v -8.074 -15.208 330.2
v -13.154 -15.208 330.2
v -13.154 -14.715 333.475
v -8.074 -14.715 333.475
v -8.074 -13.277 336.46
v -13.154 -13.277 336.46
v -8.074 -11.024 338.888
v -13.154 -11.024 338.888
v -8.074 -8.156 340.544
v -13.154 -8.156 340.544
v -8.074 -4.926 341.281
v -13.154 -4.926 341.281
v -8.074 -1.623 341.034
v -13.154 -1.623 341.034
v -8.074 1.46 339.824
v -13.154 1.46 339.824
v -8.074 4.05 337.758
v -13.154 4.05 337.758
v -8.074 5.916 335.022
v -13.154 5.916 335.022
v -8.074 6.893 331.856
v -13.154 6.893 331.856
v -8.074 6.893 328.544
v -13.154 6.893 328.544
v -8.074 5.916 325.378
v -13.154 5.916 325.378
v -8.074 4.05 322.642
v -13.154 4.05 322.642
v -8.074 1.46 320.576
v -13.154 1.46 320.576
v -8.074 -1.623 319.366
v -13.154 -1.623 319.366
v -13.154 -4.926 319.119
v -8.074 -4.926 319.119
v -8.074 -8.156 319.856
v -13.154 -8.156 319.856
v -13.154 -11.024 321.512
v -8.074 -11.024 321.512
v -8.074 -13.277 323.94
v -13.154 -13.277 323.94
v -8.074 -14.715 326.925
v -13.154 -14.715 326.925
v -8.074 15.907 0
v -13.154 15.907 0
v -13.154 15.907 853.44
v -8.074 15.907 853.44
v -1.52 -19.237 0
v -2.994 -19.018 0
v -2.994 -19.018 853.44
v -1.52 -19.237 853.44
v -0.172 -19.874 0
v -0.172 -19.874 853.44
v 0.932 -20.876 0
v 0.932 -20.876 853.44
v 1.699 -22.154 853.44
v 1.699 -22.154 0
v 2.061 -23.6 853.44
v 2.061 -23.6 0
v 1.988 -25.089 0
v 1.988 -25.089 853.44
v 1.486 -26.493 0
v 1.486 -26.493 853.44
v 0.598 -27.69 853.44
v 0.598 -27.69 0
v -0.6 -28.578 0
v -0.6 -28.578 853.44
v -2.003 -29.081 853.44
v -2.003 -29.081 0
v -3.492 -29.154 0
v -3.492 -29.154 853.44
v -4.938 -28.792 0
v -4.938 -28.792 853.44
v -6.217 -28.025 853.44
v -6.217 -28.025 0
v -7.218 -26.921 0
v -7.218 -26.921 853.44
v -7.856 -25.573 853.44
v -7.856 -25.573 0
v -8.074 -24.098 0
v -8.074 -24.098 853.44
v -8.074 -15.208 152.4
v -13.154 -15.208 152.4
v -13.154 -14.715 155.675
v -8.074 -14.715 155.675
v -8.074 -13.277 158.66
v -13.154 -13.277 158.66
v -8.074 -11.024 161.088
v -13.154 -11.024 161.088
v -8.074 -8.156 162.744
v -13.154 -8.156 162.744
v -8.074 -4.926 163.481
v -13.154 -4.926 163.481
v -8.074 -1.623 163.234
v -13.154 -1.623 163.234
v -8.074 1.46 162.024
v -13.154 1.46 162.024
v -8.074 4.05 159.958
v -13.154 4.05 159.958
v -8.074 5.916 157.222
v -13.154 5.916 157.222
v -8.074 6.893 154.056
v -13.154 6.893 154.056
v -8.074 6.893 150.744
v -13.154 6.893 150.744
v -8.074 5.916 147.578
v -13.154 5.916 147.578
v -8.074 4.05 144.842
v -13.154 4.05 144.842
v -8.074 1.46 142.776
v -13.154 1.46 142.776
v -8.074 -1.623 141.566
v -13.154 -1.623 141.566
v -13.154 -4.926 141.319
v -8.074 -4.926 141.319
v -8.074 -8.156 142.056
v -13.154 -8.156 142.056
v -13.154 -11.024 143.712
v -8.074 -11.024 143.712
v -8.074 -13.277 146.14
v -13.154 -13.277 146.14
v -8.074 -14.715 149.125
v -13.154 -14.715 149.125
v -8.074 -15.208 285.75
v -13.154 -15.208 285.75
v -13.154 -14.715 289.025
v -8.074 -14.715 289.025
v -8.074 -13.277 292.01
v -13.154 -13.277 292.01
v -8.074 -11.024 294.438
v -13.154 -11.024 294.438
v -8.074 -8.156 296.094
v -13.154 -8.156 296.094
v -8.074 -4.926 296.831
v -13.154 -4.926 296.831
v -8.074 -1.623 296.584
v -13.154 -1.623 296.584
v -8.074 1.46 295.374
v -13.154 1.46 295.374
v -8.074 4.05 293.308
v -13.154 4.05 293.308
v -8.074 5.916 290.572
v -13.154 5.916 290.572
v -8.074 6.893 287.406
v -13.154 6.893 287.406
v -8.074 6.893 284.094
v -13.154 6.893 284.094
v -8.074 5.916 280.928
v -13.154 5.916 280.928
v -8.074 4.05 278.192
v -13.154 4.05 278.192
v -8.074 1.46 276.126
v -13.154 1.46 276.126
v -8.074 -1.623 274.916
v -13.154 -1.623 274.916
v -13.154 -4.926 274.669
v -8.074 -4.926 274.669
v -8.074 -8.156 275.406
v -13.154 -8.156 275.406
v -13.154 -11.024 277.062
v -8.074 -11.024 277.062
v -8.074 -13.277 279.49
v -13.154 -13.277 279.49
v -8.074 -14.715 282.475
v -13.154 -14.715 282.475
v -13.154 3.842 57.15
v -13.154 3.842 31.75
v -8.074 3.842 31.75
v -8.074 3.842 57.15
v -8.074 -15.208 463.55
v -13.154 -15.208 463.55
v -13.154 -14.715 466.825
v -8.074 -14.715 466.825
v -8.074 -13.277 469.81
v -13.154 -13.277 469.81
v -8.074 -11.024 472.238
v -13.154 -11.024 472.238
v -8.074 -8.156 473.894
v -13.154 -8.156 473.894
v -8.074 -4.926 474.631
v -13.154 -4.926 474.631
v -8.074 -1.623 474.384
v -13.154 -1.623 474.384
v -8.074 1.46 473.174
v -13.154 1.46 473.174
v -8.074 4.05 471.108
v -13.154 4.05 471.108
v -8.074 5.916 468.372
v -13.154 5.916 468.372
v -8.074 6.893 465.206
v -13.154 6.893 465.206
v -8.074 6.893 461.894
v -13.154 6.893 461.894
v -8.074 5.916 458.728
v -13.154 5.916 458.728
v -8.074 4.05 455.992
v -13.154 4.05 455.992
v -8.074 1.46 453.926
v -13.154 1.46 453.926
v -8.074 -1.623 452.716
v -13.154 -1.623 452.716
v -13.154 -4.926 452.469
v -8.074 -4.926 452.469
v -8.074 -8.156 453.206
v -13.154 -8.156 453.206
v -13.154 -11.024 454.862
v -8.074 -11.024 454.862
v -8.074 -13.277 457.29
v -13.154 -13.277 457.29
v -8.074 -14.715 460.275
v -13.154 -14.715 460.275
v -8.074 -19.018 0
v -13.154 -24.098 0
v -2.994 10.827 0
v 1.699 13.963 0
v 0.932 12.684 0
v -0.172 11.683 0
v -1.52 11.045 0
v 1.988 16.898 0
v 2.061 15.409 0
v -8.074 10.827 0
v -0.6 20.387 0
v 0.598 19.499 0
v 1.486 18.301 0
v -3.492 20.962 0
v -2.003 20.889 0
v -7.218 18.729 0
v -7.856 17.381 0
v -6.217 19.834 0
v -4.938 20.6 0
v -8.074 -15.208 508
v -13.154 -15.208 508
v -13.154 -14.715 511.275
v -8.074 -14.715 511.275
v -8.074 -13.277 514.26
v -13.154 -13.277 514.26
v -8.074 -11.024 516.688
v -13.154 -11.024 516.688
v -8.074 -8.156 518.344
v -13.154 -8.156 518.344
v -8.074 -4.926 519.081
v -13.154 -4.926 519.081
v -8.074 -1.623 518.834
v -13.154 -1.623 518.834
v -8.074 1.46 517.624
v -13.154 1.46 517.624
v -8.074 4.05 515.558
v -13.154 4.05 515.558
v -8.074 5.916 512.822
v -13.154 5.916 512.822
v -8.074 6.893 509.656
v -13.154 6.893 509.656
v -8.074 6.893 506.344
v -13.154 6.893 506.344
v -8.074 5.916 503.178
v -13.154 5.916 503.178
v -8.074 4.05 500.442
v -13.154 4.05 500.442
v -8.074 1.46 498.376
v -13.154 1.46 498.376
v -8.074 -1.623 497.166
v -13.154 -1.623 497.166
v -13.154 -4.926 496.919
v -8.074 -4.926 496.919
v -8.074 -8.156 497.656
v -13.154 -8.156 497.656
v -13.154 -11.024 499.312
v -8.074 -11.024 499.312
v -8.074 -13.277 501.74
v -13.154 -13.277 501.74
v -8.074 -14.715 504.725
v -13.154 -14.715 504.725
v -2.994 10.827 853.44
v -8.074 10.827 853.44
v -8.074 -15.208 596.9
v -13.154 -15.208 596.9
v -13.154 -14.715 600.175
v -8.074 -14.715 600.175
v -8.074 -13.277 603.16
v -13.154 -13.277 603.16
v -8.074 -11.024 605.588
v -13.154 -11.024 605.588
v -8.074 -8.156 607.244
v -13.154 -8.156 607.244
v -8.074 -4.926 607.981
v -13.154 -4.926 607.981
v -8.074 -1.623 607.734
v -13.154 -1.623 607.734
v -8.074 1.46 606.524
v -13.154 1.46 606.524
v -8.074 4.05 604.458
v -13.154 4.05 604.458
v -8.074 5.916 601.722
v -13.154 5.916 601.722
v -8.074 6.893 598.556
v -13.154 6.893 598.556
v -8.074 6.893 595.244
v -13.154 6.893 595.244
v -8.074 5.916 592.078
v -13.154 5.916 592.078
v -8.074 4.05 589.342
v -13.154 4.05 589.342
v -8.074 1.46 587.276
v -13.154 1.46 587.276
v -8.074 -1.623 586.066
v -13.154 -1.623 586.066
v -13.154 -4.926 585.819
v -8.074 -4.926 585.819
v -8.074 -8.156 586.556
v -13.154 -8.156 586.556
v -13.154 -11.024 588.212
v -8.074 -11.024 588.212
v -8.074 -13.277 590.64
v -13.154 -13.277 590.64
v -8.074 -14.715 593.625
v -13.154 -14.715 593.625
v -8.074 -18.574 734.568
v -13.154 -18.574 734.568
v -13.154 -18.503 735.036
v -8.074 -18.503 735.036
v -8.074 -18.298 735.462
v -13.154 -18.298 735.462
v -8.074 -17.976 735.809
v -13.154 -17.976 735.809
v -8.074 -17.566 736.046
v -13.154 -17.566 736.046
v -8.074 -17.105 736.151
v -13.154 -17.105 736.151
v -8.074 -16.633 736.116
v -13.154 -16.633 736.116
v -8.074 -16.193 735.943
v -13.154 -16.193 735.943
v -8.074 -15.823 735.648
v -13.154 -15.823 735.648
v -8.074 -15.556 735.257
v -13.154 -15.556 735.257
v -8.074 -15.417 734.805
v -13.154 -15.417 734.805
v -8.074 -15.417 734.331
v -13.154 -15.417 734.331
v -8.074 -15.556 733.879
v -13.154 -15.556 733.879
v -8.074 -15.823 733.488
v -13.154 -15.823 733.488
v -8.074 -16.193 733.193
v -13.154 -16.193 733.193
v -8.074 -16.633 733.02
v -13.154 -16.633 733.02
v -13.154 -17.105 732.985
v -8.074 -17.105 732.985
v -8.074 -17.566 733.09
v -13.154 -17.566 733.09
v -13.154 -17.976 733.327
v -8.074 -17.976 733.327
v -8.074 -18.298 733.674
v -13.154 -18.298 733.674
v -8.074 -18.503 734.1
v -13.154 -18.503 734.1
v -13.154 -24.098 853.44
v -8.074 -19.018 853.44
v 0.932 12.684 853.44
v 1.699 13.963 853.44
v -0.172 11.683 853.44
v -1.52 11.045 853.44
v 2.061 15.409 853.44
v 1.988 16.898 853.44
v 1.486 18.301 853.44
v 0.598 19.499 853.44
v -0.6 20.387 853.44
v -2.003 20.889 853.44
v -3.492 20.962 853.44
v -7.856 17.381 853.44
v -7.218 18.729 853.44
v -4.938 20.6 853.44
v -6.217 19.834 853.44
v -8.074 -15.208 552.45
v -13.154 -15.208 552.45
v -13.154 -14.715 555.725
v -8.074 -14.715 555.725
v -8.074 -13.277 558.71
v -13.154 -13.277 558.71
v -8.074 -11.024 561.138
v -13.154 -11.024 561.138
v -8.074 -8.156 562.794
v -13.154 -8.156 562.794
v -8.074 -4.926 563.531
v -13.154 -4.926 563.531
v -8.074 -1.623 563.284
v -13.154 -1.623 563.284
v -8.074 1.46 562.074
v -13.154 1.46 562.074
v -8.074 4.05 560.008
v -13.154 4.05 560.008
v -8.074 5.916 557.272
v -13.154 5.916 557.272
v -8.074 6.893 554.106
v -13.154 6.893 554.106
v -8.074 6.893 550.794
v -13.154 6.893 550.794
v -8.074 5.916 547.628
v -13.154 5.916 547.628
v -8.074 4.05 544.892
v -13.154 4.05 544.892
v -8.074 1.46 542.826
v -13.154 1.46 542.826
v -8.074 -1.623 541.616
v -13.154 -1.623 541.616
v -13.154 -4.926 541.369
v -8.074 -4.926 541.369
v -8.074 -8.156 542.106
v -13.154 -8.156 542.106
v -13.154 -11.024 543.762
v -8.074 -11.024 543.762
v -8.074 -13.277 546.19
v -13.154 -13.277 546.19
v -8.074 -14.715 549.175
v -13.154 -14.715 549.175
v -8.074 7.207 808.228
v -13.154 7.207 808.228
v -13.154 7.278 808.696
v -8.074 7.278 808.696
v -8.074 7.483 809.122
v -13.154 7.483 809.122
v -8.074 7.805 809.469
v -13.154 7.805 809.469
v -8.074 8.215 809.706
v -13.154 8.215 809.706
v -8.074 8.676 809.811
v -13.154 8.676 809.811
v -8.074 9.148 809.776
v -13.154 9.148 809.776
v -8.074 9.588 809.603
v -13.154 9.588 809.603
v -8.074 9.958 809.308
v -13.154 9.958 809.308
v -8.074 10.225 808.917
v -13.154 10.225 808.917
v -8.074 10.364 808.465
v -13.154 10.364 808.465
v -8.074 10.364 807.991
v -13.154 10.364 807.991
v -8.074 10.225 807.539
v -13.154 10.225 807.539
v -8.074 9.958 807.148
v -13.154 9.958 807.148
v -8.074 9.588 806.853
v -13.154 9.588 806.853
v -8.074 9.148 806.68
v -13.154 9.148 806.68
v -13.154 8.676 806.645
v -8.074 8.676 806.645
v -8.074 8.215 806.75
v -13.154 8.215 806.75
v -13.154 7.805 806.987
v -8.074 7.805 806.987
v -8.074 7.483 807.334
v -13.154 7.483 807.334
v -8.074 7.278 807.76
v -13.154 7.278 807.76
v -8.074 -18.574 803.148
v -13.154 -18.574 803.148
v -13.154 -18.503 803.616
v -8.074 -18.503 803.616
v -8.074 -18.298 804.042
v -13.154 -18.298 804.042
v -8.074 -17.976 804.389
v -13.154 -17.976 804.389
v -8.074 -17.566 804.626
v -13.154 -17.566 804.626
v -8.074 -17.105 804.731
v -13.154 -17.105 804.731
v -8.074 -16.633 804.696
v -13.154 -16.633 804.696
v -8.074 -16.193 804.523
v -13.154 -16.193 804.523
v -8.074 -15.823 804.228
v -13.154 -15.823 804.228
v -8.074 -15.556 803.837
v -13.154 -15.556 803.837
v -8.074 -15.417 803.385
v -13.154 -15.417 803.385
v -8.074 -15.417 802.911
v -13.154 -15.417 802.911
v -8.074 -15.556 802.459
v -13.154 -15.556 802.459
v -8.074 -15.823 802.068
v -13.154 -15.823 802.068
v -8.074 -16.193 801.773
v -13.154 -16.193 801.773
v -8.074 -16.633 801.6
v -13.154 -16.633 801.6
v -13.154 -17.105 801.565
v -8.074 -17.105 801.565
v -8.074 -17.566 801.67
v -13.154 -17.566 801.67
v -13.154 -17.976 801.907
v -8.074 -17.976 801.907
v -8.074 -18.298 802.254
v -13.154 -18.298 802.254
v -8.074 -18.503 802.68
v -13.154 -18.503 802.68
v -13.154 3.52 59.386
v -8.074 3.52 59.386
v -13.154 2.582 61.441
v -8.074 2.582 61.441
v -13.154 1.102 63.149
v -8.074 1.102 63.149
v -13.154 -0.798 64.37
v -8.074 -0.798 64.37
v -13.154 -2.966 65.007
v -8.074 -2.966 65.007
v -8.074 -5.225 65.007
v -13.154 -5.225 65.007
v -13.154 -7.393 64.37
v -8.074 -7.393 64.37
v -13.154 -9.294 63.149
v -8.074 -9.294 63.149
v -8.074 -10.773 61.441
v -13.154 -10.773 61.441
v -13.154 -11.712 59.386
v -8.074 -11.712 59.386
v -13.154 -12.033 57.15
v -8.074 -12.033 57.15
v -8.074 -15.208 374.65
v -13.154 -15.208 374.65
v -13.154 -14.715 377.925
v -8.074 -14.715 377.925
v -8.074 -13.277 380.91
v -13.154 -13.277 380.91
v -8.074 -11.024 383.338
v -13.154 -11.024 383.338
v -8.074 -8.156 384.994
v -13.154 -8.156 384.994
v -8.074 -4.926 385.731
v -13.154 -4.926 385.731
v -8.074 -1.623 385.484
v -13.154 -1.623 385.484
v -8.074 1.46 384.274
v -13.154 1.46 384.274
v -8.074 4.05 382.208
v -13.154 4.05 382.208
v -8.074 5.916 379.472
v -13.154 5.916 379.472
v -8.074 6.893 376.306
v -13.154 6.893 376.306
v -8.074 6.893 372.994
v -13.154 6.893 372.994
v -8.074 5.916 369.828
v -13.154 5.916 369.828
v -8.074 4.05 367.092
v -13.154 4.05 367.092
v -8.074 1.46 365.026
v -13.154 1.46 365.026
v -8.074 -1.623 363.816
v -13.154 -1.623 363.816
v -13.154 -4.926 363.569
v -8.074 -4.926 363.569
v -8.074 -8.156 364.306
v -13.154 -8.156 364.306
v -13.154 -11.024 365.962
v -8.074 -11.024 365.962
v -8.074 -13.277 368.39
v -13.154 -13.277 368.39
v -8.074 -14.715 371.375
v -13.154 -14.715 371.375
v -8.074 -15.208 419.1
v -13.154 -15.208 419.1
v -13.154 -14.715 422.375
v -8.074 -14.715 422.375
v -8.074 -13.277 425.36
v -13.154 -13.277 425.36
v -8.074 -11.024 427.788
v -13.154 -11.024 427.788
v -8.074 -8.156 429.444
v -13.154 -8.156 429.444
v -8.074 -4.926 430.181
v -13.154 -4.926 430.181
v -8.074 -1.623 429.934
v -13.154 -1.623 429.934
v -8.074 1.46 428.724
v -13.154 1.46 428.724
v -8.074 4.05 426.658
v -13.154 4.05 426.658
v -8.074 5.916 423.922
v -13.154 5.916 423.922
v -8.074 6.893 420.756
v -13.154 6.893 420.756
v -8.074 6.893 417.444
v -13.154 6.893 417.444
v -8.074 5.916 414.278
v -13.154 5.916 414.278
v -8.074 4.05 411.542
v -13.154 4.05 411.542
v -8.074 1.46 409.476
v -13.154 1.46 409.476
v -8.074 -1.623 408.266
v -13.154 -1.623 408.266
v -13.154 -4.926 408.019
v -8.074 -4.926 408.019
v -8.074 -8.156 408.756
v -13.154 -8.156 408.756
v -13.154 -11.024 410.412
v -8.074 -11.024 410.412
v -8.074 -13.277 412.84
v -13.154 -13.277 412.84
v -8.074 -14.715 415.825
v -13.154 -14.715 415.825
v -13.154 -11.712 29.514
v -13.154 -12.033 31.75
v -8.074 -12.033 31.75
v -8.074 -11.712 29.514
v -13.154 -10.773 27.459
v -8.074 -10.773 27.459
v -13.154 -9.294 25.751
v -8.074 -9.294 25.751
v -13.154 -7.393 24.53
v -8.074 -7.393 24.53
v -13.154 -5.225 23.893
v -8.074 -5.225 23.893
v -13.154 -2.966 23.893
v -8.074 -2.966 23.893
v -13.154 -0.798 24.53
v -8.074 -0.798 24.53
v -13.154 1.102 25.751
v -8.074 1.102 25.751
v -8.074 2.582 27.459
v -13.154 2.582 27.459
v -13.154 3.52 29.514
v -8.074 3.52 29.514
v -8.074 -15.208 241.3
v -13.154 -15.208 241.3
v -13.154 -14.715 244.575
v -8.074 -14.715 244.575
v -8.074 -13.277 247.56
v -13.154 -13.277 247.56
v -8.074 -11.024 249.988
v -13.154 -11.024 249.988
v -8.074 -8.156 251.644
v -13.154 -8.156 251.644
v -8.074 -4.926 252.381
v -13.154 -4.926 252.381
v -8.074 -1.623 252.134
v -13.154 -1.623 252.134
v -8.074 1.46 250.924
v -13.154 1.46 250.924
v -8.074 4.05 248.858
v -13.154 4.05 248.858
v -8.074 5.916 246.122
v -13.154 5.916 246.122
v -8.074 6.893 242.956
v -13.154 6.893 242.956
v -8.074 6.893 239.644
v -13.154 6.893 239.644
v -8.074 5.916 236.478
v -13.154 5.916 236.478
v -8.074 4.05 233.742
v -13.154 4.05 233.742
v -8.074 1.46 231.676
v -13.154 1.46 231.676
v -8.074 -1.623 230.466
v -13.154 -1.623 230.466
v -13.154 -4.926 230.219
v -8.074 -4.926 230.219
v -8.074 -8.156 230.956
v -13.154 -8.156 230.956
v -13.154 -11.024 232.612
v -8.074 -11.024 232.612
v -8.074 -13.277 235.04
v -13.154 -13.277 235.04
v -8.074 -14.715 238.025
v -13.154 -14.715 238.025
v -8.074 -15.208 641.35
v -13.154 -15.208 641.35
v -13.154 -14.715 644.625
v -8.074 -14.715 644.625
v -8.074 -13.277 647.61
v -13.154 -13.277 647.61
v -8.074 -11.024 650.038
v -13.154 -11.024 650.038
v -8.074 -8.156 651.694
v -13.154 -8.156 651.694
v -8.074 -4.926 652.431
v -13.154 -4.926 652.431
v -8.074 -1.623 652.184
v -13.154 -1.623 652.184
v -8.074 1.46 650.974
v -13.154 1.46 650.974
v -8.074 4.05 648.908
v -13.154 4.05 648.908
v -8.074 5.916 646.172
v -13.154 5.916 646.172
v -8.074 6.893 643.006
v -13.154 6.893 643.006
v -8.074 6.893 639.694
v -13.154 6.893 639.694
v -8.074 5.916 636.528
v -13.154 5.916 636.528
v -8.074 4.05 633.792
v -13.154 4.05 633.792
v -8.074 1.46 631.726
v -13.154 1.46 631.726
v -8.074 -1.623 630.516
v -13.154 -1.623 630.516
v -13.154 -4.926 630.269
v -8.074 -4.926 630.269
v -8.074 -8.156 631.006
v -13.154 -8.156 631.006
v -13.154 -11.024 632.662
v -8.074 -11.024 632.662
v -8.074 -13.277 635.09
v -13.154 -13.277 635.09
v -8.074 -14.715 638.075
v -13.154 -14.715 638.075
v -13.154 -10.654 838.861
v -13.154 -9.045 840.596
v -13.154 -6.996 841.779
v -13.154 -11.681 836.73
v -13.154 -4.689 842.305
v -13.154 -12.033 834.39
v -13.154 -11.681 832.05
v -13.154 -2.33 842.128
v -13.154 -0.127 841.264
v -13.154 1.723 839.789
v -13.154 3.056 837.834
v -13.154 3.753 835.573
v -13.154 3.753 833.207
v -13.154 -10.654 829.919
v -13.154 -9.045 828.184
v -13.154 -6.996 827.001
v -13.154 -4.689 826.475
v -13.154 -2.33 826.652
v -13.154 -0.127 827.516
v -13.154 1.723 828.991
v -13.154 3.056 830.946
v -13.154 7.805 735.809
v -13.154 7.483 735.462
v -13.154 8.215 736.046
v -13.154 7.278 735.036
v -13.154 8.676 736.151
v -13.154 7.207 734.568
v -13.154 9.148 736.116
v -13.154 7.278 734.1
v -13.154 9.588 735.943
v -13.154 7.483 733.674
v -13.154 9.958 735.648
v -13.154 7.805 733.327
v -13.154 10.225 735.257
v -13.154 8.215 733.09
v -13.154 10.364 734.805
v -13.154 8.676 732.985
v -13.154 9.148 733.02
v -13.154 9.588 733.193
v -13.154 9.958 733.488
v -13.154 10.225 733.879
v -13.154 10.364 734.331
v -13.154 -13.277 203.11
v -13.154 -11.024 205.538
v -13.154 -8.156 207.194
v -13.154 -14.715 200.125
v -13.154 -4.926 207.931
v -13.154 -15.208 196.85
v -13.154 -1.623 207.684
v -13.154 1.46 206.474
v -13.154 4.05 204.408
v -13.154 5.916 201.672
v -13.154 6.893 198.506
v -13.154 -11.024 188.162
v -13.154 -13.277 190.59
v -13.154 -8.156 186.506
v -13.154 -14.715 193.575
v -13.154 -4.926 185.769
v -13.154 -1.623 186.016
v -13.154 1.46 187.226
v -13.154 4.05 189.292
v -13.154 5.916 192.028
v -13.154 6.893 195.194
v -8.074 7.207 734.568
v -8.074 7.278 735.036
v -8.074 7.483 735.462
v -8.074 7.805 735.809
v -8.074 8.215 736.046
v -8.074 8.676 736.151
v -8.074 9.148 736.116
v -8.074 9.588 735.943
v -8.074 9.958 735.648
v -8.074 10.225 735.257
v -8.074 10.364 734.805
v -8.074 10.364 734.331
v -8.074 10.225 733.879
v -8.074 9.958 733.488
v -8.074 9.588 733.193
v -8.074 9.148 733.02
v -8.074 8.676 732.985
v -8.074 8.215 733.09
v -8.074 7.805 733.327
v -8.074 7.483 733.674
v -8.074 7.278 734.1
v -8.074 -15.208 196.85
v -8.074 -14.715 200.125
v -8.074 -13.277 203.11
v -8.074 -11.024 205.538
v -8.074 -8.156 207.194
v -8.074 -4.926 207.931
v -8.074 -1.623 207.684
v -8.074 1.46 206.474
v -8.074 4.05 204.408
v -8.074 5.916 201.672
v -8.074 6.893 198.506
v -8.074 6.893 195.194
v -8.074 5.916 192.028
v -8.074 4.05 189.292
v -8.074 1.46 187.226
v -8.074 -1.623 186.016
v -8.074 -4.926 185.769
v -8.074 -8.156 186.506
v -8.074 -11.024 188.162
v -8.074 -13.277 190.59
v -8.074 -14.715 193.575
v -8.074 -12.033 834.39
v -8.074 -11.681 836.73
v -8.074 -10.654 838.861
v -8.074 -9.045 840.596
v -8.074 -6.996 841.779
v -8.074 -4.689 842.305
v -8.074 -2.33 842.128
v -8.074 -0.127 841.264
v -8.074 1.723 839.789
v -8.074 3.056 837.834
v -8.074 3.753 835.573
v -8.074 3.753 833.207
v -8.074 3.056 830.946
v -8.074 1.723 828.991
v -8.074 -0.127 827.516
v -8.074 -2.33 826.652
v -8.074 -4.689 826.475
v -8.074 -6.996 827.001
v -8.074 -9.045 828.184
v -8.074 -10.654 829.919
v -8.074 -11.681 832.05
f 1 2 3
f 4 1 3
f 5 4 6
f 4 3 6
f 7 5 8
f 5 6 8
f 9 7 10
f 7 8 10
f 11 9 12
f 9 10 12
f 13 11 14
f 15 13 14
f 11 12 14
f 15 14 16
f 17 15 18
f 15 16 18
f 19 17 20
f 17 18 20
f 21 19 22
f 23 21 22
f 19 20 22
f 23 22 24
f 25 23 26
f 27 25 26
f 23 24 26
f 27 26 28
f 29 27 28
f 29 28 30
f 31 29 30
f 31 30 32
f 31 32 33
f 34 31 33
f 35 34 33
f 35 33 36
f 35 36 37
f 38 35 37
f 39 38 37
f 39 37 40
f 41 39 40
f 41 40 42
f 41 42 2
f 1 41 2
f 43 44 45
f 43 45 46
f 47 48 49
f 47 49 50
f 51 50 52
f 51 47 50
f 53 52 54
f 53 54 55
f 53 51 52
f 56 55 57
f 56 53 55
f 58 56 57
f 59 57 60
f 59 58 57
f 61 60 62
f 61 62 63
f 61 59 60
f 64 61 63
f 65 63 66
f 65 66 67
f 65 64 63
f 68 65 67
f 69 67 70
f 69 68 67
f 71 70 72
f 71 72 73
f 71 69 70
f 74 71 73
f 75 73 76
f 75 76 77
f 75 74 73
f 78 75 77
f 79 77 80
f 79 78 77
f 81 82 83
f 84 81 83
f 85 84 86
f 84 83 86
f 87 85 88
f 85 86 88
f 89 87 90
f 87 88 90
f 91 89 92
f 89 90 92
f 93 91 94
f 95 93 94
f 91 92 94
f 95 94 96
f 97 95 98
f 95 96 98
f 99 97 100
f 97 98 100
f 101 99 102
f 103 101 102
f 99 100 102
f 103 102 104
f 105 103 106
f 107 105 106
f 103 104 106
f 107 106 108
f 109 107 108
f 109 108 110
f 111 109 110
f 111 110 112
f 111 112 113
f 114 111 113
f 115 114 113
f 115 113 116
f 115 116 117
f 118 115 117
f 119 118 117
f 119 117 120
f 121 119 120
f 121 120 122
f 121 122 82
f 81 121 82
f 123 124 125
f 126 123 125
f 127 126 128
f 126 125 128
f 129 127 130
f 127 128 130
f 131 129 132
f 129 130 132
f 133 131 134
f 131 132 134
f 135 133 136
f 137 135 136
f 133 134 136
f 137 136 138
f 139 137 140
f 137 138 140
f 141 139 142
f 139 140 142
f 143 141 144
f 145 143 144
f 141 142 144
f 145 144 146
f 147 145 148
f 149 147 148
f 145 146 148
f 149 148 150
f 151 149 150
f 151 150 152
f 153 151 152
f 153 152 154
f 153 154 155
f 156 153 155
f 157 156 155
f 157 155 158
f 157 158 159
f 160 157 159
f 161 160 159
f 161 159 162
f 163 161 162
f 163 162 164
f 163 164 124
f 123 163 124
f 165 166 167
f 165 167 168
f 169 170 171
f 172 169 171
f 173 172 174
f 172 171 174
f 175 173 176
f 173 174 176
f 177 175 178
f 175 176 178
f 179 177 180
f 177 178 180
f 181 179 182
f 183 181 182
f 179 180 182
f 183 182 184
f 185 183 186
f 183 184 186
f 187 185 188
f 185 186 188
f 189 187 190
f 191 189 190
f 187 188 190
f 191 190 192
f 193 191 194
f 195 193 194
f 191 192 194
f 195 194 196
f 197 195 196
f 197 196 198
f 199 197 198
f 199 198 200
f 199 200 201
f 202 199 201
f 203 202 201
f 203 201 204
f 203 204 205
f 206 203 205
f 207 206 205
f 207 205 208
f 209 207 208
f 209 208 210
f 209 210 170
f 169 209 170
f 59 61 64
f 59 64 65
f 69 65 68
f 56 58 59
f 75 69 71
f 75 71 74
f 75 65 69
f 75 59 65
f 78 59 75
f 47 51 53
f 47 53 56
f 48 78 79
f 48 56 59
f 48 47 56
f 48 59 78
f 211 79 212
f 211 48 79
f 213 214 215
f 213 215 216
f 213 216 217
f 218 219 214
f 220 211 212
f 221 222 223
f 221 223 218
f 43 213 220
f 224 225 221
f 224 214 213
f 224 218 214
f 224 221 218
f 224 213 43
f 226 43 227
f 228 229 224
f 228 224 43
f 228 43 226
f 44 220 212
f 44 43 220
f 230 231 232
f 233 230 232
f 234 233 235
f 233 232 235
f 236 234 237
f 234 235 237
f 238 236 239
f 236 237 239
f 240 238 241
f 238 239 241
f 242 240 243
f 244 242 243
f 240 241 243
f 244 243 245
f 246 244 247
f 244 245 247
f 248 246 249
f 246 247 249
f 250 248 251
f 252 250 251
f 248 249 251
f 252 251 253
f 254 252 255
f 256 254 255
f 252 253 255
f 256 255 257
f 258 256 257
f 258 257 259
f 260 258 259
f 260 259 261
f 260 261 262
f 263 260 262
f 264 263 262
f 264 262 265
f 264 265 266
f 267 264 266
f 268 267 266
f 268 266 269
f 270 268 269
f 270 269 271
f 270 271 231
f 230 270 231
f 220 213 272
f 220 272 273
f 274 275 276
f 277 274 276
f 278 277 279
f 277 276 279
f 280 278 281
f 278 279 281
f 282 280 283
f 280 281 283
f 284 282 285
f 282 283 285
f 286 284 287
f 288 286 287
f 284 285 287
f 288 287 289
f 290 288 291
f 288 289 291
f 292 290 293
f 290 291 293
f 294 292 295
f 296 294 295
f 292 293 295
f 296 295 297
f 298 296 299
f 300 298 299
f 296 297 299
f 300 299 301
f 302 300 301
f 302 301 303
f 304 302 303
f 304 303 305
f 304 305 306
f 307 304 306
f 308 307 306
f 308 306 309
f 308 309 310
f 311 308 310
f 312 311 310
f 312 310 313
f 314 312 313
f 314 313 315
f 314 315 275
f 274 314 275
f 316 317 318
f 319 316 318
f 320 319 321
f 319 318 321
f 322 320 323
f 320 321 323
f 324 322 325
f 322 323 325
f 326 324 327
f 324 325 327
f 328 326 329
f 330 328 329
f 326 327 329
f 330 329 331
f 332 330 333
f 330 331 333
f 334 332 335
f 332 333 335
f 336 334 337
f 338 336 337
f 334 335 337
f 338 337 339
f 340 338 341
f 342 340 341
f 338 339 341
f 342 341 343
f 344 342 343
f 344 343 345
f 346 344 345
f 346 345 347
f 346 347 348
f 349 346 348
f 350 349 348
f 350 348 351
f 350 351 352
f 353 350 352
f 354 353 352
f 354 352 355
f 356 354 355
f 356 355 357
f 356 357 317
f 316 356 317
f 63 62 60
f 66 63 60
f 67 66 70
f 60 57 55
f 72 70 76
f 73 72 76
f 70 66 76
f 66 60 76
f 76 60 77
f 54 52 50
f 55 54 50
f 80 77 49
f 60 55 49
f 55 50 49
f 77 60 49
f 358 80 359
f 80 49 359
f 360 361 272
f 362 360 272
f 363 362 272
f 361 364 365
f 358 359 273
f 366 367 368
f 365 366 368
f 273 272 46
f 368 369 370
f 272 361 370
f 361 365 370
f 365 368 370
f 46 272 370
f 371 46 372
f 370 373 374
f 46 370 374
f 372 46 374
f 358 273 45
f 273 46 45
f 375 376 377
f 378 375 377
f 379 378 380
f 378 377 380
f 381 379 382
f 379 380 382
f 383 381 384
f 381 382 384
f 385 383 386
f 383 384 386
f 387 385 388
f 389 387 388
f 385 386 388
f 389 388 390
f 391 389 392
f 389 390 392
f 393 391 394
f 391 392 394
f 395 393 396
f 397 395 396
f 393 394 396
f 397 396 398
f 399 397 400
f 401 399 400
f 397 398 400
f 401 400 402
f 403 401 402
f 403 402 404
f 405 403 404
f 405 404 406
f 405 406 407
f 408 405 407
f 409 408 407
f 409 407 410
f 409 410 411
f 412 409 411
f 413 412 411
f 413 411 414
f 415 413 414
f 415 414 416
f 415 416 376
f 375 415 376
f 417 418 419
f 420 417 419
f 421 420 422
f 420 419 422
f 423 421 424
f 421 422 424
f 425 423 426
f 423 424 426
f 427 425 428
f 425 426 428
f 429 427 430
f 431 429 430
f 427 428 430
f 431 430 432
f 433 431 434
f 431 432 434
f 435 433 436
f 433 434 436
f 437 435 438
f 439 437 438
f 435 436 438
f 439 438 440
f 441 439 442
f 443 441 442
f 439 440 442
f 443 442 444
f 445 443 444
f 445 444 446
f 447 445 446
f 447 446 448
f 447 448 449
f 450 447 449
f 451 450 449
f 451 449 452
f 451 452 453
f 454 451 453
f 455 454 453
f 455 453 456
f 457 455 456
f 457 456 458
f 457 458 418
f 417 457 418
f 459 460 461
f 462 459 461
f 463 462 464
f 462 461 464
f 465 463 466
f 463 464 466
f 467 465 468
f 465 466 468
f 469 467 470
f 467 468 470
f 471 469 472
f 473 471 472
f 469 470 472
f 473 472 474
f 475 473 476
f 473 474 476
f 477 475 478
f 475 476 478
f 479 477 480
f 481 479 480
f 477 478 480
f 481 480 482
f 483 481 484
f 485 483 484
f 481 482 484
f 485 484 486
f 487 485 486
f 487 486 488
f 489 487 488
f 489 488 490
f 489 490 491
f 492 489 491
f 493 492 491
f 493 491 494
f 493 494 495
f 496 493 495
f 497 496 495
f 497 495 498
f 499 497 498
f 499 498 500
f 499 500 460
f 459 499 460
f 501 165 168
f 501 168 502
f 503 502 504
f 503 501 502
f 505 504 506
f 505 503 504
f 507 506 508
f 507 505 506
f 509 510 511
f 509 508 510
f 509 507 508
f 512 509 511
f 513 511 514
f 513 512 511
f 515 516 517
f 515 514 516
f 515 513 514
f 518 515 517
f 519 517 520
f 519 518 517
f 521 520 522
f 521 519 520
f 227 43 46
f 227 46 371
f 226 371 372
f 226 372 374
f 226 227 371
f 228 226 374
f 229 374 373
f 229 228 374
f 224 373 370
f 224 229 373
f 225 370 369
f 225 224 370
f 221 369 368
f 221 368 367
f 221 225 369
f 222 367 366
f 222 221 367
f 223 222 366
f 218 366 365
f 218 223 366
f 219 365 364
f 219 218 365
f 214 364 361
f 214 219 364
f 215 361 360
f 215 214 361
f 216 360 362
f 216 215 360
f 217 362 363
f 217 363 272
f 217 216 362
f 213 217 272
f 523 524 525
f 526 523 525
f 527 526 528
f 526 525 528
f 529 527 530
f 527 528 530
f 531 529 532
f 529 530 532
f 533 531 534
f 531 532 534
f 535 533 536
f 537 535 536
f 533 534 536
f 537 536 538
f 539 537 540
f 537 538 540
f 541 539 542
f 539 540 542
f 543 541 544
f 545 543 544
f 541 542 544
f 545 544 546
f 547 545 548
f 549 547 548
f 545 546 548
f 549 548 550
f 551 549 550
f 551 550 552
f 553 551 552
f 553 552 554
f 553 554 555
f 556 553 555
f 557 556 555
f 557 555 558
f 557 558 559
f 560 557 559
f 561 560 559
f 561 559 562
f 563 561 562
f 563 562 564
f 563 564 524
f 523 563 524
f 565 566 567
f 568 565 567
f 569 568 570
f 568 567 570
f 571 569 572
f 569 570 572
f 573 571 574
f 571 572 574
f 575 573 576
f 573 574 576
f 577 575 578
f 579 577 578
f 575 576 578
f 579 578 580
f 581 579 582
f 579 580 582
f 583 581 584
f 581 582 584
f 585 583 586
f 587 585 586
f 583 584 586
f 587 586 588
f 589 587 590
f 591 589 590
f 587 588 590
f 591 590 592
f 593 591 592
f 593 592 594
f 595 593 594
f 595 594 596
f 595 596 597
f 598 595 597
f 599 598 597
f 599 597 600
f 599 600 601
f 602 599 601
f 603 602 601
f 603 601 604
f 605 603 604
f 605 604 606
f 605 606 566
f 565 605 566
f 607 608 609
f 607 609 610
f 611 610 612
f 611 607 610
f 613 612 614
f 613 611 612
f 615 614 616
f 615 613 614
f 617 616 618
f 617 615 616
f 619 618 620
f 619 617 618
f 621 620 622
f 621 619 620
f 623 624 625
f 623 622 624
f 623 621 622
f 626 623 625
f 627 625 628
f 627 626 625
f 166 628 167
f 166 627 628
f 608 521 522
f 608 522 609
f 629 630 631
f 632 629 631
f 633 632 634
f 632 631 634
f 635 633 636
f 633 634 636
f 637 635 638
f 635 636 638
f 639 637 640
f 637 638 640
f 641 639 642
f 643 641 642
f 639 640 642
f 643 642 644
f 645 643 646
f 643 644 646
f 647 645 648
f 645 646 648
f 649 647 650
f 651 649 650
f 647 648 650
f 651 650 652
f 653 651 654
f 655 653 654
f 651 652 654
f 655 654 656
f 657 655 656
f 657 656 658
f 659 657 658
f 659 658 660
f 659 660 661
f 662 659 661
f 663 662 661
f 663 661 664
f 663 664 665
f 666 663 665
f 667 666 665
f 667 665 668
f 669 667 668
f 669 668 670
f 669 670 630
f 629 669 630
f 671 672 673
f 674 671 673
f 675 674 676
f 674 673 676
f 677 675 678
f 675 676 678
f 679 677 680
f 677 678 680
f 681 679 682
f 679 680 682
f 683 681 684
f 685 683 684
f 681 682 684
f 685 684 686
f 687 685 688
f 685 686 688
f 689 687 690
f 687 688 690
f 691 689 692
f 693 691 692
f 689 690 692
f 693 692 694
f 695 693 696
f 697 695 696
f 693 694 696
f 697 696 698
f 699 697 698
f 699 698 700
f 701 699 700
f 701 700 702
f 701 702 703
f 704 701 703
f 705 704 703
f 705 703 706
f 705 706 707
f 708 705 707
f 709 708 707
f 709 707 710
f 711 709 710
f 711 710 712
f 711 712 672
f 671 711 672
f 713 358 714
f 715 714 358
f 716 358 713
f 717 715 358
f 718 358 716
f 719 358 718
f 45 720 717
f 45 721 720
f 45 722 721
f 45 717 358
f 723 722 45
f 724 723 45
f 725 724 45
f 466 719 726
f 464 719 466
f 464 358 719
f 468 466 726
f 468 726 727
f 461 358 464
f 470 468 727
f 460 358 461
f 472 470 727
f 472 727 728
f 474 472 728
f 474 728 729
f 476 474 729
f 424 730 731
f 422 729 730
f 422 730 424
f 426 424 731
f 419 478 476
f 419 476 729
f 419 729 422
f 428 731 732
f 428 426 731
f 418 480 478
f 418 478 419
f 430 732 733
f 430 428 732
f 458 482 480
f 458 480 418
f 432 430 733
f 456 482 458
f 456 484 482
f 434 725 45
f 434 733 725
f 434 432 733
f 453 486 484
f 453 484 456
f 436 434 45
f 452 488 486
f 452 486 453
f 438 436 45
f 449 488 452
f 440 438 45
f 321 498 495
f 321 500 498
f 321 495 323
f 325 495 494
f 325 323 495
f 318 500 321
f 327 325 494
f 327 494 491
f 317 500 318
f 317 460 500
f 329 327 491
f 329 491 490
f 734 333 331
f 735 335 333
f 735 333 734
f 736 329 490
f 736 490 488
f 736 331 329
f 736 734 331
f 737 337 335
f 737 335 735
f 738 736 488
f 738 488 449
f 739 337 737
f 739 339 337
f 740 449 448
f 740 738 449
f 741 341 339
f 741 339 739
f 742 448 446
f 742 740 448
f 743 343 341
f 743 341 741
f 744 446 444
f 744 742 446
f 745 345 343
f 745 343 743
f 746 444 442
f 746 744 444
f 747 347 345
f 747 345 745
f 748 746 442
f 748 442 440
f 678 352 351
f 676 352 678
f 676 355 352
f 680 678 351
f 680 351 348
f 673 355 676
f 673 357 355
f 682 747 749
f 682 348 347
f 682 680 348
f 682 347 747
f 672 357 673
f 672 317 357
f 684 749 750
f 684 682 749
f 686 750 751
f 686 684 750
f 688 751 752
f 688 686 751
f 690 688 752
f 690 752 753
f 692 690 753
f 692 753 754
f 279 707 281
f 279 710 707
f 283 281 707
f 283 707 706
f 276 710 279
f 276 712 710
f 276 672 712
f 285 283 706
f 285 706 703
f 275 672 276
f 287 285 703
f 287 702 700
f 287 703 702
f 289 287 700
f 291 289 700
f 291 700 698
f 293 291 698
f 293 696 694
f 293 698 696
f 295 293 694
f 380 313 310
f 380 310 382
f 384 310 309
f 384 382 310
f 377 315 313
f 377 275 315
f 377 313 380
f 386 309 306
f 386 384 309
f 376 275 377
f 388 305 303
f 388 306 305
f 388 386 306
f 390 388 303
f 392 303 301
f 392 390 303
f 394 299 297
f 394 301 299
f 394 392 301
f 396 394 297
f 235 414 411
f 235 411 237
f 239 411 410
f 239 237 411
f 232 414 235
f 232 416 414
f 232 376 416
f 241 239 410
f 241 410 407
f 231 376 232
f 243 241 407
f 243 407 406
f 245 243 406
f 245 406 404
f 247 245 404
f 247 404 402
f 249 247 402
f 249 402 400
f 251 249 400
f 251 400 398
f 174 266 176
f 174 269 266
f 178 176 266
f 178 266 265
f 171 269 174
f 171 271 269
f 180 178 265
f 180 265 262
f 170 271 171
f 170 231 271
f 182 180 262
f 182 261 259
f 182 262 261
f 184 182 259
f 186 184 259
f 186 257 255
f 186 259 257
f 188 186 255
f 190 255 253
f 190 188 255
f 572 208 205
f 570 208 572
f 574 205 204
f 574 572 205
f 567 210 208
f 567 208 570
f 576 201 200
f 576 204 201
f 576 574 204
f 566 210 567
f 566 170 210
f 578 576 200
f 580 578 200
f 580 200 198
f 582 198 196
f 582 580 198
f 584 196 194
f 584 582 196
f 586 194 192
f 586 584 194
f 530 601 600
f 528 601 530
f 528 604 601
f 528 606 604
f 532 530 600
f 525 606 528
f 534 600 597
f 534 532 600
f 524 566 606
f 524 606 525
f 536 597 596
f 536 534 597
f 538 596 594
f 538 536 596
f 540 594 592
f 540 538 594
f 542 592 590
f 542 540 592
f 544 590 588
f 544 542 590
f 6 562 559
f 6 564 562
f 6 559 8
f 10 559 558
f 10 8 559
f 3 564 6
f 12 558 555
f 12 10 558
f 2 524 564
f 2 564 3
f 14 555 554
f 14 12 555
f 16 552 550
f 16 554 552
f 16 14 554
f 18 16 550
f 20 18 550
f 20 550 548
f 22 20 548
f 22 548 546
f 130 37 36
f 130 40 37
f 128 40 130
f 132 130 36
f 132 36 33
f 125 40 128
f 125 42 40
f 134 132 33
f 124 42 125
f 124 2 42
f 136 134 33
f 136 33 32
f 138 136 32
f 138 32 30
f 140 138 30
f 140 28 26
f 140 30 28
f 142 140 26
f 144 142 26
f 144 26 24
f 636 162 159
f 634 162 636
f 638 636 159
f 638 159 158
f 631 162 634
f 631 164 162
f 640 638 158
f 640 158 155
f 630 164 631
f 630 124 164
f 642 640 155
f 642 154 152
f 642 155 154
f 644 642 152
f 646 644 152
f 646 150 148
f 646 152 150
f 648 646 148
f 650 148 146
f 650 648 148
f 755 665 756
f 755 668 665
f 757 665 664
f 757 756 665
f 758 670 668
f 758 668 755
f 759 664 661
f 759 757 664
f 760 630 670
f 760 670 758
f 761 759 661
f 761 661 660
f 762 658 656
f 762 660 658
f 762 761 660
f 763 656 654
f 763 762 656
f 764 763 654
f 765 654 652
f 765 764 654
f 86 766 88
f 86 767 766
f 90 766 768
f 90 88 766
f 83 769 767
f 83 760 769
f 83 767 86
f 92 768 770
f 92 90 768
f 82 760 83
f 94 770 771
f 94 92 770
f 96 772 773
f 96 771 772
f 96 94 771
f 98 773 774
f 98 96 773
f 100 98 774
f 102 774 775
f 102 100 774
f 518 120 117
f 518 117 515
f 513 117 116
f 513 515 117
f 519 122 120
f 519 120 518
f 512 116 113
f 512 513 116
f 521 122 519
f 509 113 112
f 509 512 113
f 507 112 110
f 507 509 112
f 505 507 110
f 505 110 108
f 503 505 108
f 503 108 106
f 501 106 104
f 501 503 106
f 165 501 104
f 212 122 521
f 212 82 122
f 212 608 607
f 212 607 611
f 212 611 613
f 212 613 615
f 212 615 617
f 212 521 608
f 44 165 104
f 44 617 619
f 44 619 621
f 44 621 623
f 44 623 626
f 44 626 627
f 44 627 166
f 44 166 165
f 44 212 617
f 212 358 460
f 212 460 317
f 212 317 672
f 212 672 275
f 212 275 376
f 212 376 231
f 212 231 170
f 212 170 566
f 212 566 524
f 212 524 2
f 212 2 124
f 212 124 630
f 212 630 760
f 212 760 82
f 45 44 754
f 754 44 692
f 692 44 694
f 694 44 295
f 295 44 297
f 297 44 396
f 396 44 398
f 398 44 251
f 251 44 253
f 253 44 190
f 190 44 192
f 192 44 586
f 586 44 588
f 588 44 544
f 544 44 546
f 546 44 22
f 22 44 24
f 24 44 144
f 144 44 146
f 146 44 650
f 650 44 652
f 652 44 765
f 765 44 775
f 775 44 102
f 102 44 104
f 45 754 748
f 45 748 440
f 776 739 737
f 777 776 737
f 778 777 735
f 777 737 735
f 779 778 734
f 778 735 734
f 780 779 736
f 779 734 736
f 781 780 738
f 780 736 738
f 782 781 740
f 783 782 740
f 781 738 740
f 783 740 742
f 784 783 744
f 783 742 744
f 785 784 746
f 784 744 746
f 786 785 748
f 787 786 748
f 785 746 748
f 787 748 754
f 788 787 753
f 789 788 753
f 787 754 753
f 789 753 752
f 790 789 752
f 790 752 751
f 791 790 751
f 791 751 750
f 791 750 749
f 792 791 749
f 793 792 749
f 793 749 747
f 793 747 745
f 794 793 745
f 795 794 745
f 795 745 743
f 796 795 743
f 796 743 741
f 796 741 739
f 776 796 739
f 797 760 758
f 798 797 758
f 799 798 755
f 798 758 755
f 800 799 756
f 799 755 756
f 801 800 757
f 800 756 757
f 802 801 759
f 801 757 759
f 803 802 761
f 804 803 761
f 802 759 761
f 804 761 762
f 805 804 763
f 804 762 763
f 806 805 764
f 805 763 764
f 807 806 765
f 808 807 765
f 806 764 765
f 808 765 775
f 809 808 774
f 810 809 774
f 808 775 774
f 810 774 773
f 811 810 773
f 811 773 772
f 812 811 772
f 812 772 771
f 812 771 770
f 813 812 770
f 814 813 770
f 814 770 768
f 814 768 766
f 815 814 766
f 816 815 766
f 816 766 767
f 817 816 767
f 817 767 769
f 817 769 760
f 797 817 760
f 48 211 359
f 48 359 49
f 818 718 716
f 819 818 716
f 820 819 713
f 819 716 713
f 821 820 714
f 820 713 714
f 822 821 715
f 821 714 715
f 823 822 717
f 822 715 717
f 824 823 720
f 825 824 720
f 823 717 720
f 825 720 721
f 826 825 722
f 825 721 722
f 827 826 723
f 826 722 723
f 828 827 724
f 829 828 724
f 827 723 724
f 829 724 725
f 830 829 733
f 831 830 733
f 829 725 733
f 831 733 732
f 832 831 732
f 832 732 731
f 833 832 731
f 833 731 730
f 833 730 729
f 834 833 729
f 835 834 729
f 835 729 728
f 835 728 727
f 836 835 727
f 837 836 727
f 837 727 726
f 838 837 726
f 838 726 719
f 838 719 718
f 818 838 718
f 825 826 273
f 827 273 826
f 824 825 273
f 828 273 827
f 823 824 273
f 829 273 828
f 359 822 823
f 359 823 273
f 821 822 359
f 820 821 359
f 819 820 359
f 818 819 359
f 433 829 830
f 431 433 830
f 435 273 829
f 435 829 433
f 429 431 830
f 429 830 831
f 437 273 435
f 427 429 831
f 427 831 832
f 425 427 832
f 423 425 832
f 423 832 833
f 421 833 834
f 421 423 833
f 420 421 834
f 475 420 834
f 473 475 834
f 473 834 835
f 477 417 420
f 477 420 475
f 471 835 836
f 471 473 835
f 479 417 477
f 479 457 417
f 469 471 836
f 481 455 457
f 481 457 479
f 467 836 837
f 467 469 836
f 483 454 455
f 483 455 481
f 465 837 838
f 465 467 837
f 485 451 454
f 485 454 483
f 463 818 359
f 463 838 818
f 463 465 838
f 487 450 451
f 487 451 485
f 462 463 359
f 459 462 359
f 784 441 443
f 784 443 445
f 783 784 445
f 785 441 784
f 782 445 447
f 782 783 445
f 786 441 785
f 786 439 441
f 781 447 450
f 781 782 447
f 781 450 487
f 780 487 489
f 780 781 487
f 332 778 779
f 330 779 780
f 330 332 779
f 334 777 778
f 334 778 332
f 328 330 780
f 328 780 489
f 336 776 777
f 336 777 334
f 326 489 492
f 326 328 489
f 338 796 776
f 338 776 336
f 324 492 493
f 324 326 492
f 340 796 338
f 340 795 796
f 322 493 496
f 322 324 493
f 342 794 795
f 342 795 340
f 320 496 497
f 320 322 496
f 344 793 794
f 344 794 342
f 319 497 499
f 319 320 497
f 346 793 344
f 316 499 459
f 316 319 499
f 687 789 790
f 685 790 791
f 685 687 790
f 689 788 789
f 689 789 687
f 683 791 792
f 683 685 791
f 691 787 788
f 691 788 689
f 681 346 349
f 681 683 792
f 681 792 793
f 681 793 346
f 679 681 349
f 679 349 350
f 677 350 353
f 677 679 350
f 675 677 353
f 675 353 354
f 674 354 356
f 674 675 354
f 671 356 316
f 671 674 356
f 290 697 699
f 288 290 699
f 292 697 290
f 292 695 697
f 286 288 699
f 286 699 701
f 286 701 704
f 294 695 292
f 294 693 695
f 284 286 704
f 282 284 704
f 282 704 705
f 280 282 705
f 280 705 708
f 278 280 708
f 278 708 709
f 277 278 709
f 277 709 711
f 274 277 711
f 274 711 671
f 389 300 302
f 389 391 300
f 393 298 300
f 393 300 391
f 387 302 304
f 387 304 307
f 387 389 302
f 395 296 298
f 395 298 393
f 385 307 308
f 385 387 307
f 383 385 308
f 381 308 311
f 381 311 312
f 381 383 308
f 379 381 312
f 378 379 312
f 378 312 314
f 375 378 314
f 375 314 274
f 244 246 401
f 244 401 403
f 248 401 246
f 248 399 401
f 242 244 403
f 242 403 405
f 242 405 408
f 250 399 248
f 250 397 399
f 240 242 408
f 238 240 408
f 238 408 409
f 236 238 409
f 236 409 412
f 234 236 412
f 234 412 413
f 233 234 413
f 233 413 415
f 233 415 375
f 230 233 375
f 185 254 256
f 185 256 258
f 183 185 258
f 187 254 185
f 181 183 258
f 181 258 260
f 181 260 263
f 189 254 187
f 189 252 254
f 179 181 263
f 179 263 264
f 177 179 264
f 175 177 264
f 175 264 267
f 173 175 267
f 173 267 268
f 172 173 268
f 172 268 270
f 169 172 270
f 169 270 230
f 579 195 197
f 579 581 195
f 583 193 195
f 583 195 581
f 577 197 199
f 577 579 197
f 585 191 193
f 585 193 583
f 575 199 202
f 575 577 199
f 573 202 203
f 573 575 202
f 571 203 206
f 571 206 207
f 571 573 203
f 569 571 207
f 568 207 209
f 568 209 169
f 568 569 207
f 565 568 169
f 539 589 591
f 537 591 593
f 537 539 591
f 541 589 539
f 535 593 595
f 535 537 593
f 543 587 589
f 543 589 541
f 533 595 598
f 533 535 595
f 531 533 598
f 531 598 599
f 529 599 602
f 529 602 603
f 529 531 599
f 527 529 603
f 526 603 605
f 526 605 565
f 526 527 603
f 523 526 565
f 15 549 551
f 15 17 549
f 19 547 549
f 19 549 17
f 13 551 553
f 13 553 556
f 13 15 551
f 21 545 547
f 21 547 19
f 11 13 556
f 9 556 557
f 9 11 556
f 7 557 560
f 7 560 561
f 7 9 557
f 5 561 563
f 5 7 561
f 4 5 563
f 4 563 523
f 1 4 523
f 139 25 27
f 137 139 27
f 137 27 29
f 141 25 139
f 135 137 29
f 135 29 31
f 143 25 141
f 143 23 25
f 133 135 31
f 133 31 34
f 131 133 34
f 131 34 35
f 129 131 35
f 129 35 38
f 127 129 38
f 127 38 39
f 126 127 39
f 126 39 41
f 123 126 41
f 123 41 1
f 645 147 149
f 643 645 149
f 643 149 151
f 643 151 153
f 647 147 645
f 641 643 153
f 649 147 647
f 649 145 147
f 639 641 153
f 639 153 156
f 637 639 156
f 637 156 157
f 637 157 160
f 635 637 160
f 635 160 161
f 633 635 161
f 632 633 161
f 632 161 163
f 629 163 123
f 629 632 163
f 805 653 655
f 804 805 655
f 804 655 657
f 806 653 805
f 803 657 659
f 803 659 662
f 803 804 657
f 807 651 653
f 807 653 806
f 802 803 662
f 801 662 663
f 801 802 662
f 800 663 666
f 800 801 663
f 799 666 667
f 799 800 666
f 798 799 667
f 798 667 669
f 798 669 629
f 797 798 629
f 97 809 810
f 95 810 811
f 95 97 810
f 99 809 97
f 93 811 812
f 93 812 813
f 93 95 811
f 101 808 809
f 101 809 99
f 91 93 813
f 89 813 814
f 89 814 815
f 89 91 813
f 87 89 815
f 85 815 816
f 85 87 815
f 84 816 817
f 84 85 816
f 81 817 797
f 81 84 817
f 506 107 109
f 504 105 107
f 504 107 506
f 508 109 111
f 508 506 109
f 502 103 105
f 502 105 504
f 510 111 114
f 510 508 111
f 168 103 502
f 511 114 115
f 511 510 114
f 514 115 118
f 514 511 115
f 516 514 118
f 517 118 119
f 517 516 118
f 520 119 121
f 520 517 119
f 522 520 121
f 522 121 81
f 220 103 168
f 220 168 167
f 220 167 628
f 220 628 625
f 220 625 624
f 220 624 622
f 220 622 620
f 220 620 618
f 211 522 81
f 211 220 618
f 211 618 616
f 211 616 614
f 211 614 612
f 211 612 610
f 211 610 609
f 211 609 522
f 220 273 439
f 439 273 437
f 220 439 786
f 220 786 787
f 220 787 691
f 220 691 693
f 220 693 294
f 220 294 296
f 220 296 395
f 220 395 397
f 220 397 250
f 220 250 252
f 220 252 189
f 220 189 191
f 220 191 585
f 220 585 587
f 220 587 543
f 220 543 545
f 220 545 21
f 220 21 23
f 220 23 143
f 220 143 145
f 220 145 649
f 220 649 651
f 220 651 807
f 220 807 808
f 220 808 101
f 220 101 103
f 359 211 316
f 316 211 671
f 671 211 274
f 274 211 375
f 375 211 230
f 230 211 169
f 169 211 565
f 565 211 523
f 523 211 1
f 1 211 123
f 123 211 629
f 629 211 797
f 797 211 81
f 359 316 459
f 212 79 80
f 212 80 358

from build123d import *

# Parameters (mm, degrees)
BOSS_EXTRUDE1_DEPTH = 853.44
SKETCH2_R           = 11.1125
CUT_EXTRUDE1_DEPTH  = 25.4
LPATTERN1_COUNT     = 12
LPATTERN1_PITCH     = 44.45
SKETCH3_R           = 7.9375
CUT_EXTRUDE2_DEPTH  = 25.4
SKETCH5_R           = 1.5875
CUT_EXTRUDE3_DEPTH  = 12.7


with BuildPart() as part:
    # Sketch1 → Boss-Extrude1 (new body)
    with BuildSketch(Plane.XY):
        with BuildLine():
            Line((-13.154409933, 15.906683314), (-8.074409933, 15.906683314))
            ThreePointArc((-8.074409933, 15.906683314), (0.597692516, 19.498785762), (-2.994409933, 10.826683314))
            Line((-2.994409933, 10.826683314), (-8.074409933, 10.826683314))
            Line((-8.074409933, 10.826683314), (-8.074409933, -19.018316686))
            Line((-8.074409933, -19.018316686), (-2.994409933, -19.018316686))
            ThreePointArc((-2.994409933, -19.018316686), (0.597692516, -27.690419135), (-8.074409933, -24.098316686))
            Line((-8.074409933, -24.098316686), (-13.154409933, -24.098316686))
            Line((-13.154409933, -24.098316686), (-13.154409933, 15.906683314))
        make_face()
    extrude(amount=BOSS_EXTRUDE1_DEPTH)

    # Sketch2 → Cut-Extrude1 (cut)
    with BuildSketch(Plane.ZY.offset(13.154409933)):
        with Locations(Location((152.4, -4.095816686, 0), (0, 0, 270))):
            Circle(SKETCH2_R)
    cut_extrude1 = extrude(amount=-CUT_EXTRUDE1_DEPTH, mode=Mode.SUBTRACT)

    # LPattern1: Cut-Extrude1 ×12
    with Locations(*[(0, 0, i * LPATTERN1_PITCH) for i in range(1, LPATTERN1_COUNT)]):
        add(cut_extrude1, mode=Mode.SUBTRACT)

    # Sketch3 → Cut-Extrude2 (cut)
    with BuildSketch(Plane.ZY.offset(13.154409933)):
        with Locations(Location((834.39, -4.095816686, 0), (0, 0, 270))):
            Circle(SKETCH3_R)
        with BuildLine():
            Line((31.75, 3.841683314), (57.15, 3.841683314))
            ThreePointArc((57.15, 3.841683314), (65.0875, -4.095816686), (57.15, -12.033316686))
            Line((57.15, -12.033316686), (31.75, -12.033316686))
            ThreePointArc((31.75, -12.033316686), (23.8125, -4.095816686), (31.75, 3.841683314))
        make_face()
    extrude(amount=-CUT_EXTRUDE2_DEPTH, mode=Mode.SUBTRACT)

    # Sketch5 → Cut-Extrude3 (cut)
    with BuildSketch(Plane.ZY.offset(13.154409933)):
        with Locations(Location((734.568, 8.794683314, 0), (0, 0, 270))):
            Circle(SKETCH5_R)
        with Locations(Location((808.228, 8.794683314, 0), (0, 0, 270))):
            Circle(SKETCH5_R)
        with Locations(Location((803.148, -16.986316686, 0), (0, 0, 270))):
            Circle(SKETCH5_R)
        with Locations(Location((734.568, -16.986316686, 0), (0, 0, 270))):
            Circle(SKETCH5_R)
    extrude(amount=-CUT_EXTRUDE3_DEPTH, mode=Mode.SUBTRACT)


solid = part.part
